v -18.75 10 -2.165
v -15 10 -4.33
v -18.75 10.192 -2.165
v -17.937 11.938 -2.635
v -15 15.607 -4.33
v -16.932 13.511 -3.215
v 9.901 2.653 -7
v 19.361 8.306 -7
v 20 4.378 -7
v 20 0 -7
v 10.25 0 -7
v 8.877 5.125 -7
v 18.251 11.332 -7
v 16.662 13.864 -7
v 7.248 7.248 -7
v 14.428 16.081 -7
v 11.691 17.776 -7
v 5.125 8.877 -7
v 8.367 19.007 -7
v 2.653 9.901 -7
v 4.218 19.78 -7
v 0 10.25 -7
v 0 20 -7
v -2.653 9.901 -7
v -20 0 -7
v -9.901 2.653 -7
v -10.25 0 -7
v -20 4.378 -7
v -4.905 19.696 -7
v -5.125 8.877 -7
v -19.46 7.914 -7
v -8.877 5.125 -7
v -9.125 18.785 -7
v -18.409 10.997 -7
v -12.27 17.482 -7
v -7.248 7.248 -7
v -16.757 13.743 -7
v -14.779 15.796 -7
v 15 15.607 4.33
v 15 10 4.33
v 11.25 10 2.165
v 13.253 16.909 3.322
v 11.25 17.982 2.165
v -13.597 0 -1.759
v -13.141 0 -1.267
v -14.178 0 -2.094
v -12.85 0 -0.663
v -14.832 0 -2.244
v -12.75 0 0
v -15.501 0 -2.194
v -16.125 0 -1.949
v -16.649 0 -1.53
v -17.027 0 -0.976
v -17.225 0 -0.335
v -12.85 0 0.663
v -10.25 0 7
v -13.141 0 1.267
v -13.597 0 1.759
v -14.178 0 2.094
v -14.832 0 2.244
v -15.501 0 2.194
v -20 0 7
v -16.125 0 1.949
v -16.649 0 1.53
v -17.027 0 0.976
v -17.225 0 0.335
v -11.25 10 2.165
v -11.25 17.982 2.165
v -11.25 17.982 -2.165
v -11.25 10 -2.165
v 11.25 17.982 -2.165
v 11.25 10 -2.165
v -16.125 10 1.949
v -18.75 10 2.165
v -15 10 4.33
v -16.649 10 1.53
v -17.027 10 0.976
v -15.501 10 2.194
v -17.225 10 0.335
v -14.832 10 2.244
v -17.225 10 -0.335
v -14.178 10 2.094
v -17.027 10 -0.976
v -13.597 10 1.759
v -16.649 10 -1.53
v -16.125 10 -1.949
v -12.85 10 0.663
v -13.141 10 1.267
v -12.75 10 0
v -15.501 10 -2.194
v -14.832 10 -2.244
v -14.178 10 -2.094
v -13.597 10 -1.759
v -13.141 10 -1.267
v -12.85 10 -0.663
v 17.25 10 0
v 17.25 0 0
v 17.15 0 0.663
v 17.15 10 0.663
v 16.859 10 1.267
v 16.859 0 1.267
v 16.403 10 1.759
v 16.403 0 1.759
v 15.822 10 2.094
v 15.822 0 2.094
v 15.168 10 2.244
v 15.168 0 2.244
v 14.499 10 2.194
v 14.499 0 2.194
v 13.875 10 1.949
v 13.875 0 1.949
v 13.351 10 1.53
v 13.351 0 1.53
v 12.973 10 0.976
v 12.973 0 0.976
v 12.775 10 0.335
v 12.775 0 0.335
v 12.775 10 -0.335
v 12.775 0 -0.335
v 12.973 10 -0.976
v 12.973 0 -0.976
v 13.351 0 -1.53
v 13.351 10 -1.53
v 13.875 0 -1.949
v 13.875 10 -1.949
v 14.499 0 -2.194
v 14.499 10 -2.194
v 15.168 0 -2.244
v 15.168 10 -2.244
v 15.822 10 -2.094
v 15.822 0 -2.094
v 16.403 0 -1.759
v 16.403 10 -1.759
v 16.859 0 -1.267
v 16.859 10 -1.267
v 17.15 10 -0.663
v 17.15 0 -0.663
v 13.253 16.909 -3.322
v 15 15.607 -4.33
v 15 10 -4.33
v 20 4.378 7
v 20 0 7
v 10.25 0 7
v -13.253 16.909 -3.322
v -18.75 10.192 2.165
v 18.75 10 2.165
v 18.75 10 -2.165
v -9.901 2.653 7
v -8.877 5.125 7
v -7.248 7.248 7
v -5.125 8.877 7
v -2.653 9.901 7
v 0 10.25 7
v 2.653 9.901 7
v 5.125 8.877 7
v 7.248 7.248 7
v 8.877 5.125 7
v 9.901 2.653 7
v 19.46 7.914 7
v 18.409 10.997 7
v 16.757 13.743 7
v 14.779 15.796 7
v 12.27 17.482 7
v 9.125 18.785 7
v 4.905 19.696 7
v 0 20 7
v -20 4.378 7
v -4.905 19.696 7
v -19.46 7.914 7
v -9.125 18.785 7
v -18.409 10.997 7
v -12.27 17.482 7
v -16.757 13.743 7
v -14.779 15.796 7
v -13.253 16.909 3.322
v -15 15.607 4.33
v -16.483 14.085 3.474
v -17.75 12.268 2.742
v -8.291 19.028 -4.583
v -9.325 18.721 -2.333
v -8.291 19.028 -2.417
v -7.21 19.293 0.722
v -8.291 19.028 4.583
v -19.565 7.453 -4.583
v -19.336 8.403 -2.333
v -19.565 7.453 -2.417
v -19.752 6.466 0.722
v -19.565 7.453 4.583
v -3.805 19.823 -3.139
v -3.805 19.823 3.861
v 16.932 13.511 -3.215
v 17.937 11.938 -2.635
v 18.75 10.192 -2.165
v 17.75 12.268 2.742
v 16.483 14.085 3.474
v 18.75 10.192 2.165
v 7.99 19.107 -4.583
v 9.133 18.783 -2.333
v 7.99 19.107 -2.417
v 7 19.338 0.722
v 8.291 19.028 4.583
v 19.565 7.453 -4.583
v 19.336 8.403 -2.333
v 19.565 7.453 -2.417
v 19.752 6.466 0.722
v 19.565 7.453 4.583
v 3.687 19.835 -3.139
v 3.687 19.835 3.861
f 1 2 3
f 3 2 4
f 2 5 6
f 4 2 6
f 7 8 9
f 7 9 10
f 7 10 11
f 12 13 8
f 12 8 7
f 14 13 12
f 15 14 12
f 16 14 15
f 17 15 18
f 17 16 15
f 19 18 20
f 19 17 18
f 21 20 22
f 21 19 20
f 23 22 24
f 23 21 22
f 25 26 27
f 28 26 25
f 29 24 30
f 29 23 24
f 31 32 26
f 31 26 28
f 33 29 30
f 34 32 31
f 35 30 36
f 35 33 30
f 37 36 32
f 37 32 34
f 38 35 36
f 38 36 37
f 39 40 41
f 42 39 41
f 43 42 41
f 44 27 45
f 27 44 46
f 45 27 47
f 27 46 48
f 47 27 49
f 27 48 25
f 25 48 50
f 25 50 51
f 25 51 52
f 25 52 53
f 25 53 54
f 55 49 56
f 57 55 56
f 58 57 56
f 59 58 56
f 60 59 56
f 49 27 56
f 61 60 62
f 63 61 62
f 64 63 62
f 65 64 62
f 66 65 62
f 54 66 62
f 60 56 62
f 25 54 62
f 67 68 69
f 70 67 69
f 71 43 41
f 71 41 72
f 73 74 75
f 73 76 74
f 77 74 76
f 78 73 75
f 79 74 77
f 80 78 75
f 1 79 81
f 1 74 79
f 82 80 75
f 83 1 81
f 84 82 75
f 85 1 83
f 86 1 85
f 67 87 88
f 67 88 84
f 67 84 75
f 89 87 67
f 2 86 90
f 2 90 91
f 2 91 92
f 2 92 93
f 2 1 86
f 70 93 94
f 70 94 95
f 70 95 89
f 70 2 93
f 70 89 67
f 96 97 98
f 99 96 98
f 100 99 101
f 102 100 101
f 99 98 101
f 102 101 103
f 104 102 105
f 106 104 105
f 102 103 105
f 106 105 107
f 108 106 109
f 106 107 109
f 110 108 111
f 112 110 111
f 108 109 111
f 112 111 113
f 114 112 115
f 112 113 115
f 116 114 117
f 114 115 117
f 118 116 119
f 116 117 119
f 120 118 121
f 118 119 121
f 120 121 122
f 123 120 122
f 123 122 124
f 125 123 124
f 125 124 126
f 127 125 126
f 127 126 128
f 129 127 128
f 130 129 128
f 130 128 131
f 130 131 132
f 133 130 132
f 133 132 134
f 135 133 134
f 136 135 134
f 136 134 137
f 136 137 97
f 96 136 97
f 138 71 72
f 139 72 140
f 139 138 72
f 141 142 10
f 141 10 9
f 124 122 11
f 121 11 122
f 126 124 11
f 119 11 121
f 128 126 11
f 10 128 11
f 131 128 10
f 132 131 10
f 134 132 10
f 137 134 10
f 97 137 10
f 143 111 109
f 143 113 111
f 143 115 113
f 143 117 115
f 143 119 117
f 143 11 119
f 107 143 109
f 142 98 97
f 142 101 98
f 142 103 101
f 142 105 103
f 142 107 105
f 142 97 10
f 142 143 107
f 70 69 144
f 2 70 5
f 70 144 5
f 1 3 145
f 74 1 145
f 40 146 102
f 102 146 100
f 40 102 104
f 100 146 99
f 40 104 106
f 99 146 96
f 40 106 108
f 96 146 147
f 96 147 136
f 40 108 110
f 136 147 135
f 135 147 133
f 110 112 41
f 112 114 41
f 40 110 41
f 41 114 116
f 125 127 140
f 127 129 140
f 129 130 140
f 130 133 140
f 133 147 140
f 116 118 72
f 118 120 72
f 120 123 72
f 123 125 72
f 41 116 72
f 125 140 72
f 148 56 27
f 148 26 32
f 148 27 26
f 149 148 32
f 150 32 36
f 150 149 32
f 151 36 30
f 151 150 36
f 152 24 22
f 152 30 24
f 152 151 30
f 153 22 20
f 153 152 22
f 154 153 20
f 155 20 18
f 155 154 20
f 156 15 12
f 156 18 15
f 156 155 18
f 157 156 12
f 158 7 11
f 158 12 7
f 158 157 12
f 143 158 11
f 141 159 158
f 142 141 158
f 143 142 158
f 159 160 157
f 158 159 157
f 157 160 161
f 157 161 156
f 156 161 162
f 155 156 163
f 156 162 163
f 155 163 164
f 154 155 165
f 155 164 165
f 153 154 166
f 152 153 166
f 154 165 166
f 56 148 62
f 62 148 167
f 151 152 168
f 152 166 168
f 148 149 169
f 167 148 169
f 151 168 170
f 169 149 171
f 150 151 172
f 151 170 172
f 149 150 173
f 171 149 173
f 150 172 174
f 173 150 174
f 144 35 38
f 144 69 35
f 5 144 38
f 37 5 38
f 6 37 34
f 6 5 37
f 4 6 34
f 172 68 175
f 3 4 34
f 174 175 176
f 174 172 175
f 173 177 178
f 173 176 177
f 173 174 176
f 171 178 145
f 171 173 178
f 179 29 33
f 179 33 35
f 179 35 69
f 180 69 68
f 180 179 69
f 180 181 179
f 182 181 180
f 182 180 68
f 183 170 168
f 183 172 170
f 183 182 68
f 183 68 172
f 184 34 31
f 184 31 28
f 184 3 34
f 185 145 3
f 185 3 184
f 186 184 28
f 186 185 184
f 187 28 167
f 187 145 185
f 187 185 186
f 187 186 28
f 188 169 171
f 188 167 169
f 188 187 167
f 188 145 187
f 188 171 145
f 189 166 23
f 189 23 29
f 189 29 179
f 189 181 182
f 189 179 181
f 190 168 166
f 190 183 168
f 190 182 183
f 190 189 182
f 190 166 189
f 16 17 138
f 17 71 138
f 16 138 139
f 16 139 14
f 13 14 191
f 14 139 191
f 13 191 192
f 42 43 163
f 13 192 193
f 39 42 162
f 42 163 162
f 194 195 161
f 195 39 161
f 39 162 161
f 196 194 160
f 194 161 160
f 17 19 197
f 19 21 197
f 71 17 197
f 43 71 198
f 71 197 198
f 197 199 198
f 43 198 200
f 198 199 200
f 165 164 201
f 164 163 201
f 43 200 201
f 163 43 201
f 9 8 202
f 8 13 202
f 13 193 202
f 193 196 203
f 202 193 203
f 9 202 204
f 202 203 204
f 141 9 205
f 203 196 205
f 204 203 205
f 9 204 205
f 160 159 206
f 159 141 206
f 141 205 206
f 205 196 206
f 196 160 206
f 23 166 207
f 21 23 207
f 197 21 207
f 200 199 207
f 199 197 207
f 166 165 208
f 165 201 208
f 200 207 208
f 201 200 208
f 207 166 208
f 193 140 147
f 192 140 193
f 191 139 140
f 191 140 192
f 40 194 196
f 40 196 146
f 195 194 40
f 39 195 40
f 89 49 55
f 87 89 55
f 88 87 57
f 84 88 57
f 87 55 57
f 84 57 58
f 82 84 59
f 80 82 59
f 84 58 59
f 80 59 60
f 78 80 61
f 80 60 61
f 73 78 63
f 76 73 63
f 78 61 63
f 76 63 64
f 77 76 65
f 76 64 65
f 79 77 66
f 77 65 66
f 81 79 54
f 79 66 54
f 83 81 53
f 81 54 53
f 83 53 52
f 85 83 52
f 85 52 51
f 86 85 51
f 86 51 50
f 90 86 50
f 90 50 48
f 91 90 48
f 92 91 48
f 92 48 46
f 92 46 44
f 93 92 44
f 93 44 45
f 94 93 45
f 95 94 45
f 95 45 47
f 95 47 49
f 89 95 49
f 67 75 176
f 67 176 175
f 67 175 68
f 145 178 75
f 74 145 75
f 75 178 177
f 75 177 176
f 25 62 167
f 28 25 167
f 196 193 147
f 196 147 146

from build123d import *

# Parameters (mm, degrees)
BOSS_EXTRUDE1_DEPTH    = 7
FILLET1_R              = 2
SPLIT1_SURFACE_1_BACK  = 47.861
SPLIT1_SURFACE_1_DEPTH = 95.722
SPLIT1_SURFACE_2_BACK  = 47.861
SPLIT1_SURFACE_2_DEPTH = 95.722
CUT_EXTRUDE2_DEPTH     = 14
CUT_EXTRUDE8_DEPTH     = 32.559467847
SKETCH10_R             = 2.25
CUT_EXTRUDE6_DEPTH     = 35
CUT_EXTRUDE7_DEPTH     = 10
BOSS_EXTRUDE2_DEPTH    = 14


with BuildPart() as part:
    # Sketch1 → Boss-Extrude1 (new, symmetric)
    with BuildSketch(Plane.XY):
        with BuildLine():
            Line((10.25, 0), (20, 0))
            Line((20, 0), (20, 20))
            Line((20, 20), (-20, 20))
            Line((-20, 20), (-20, 0))
            Line((-20, 0), (-10.25, 0))
            ThreePointArc((-10.25, 0), (0, 10.25), (10.25, 0))
        make_face()
    extrude(amount=BOSS_EXTRUDE1_DEPTH, both=True)

    # Fillet1
    fillet1_edges = [part.edges().sort_by_distance(p)[0] for p in [
        (20, 0, 0),
        (-20, 0, 0),
    ]]
    fillet(fillet1_edges, radius=FILLET1_R)


with BuildPart() as body_2:
    # Split1: the piece behind the surface
    add(part.part)
    # Split1 surface: a surface, the sketch's curves swept straight by 95.722 mm
    with BuildLine(Plane.XY.offset(7).offset(-SPLIT1_SURFACE_1_BACK), mode=Mode.PRIVATE) as split1_surface_1_path:
        Line((0, 20), (0, 0))
    split1_surface_1 = Shell.extrude(split1_surface_1_path.wire(), (0 * SPLIT1_SURFACE_1_DEPTH, 0 * SPLIT1_SURFACE_1_DEPTH, 1 * SPLIT1_SURFACE_1_DEPTH))
    split(bisect_by=split1_surface_1, keep=Keep.BOTTOM)

    # Sketch6 → Cut-Extrude2 (cut)
    with BuildSketch(Plane.XY.offset(7)):
        with BuildLine():
            Line((-20, 20), (-20, 4.378237371))
            add(Edge.make_bspline(
                [(0, 20), (-18.821096643, 20), (-20, 4.378237371)],
                knots=[0, 0, 0, 0.882109664, 0.882109664, 0.882109664], degree=2))
            Line((0, 20), (-20, 20))
        make_face()
    extrude(amount=-CUT_EXTRUDE2_DEPTH, mode=Mode.SUBTRACT)


with BuildPart() as part_1:
    add(part.part)

    # Split1: split by a surface, the side it looks to stays
    # Split1 surface: a surface, the sketch's curves swept straight by 95.722 mm
    with BuildLine(Plane.XY.offset(7).offset(-SPLIT1_SURFACE_2_BACK), mode=Mode.PRIVATE) as split1_surface_2_path:
        Line((0, 20), (0, 0))
    split1_surface_2 = Shell.extrude(split1_surface_2_path.wire(), (0 * SPLIT1_SURFACE_2_DEPTH, 0 * SPLIT1_SURFACE_2_DEPTH, 1 * SPLIT1_SURFACE_2_DEPTH))
    split(bisect_by=split1_surface_2, keep=Keep.TOP)

    # Sketch6<3> → Cut-Extrude8 (cut, through all)
    with BuildSketch(Plane.XY.offset(7)):
        with BuildLine():
            Line((20, 20), (0, 20))
            add(Edge.make_bspline(
                [(0, 20), (18.821096643, 20), (20, 4.378237371)],
                knots=[0, 0, 0, 0.882109664, 0.882109664, 0.882109664], degree=2))
            Line((20, 4.378237371), (20, 20))
        make_face()
    extrude(amount=-CUT_EXTRUDE8_DEPTH, mode=Mode.SUBTRACT)


with BuildPart() as cut_extrude6_tool:
    # Sketch10 → Cut-Extrude6 (new body)
    with BuildSketch(Plane.XZ):
        with Locations((15, 0)):
            Circle(SKETCH10_R)
        with Locations((-15, 0)):
            Circle(SKETCH10_R)
    extrude(amount=-CUT_EXTRUDE6_DEPTH)


with BuildPart() as part_2:
    add(part_1.part)

    # Cut-Extrude6: cut by cut_extrude6_tool
    add(cut_extrude6_tool.part, mode=Mode.SUBTRACT)


with BuildPart() as body_2_1:
    add(body_2.part)

    # Cut-Extrude6: cut by cut_extrude6_tool
    add(cut_extrude6_tool.part, mode=Mode.SUBTRACT)


with BuildPart() as cut_extrude7_tool:
    # Sketch11 → Cut-Extrude7 (new body)
    with BuildSketch(Plane(origin=(0, 20, 0), x_dir=(1, 0, 0), z_dir=(0, 1, 0))):
        Polygon((-11.25, -2.165063509), (-11.25, 2.165063509), (-15, 4.330127019), (-18.75, 2.165063509), (-18.75, -2.165063509), (-15, -4.330127019), align=None)
        Polygon((15, -4.330127019), (11.25, -2.165063509), (11.25, 2.165063509), (15, 4.330127019), (18.75, 2.165063509), (18.75, -2.165063509), align=None)
    extrude(amount=-CUT_EXTRUDE7_DEPTH)


with BuildPart() as part_3:
    add(part_2.part)

    # Cut-Extrude7: cut by cut_extrude7_tool
    add(cut_extrude7_tool.part, mode=Mode.SUBTRACT)


with BuildPart() as body_2_2:
    add(body_2_1.part)

    # Cut-Extrude7: cut by cut_extrude7_tool
    add(cut_extrude7_tool.part, mode=Mode.SUBTRACT)

    # Combine1: union part
    add(part_3.part)

    # Sketch12 → Boss-Extrude2 (add)
    with BuildSketch(Plane.XY.offset(7)):
        with BuildLine():
            Line((-18, 0), (-20, 0))
            Line((-20, 0), (-20, 2))
            ThreePointArc((-20, 2), (-19.414213562, 0.585786438), (-18, 0))
        make_face()
        with BuildLine():
            Line((18, 0), (20, 0))
            Line((20, 0), (20, 2))
            ThreePointArc((20, 2), (19.414213562, 0.585786438), (18, 0))
        make_face()
    extrude(amount=-BOSS_EXTRUDE2_DEPTH)


solid = body_2_2.part
